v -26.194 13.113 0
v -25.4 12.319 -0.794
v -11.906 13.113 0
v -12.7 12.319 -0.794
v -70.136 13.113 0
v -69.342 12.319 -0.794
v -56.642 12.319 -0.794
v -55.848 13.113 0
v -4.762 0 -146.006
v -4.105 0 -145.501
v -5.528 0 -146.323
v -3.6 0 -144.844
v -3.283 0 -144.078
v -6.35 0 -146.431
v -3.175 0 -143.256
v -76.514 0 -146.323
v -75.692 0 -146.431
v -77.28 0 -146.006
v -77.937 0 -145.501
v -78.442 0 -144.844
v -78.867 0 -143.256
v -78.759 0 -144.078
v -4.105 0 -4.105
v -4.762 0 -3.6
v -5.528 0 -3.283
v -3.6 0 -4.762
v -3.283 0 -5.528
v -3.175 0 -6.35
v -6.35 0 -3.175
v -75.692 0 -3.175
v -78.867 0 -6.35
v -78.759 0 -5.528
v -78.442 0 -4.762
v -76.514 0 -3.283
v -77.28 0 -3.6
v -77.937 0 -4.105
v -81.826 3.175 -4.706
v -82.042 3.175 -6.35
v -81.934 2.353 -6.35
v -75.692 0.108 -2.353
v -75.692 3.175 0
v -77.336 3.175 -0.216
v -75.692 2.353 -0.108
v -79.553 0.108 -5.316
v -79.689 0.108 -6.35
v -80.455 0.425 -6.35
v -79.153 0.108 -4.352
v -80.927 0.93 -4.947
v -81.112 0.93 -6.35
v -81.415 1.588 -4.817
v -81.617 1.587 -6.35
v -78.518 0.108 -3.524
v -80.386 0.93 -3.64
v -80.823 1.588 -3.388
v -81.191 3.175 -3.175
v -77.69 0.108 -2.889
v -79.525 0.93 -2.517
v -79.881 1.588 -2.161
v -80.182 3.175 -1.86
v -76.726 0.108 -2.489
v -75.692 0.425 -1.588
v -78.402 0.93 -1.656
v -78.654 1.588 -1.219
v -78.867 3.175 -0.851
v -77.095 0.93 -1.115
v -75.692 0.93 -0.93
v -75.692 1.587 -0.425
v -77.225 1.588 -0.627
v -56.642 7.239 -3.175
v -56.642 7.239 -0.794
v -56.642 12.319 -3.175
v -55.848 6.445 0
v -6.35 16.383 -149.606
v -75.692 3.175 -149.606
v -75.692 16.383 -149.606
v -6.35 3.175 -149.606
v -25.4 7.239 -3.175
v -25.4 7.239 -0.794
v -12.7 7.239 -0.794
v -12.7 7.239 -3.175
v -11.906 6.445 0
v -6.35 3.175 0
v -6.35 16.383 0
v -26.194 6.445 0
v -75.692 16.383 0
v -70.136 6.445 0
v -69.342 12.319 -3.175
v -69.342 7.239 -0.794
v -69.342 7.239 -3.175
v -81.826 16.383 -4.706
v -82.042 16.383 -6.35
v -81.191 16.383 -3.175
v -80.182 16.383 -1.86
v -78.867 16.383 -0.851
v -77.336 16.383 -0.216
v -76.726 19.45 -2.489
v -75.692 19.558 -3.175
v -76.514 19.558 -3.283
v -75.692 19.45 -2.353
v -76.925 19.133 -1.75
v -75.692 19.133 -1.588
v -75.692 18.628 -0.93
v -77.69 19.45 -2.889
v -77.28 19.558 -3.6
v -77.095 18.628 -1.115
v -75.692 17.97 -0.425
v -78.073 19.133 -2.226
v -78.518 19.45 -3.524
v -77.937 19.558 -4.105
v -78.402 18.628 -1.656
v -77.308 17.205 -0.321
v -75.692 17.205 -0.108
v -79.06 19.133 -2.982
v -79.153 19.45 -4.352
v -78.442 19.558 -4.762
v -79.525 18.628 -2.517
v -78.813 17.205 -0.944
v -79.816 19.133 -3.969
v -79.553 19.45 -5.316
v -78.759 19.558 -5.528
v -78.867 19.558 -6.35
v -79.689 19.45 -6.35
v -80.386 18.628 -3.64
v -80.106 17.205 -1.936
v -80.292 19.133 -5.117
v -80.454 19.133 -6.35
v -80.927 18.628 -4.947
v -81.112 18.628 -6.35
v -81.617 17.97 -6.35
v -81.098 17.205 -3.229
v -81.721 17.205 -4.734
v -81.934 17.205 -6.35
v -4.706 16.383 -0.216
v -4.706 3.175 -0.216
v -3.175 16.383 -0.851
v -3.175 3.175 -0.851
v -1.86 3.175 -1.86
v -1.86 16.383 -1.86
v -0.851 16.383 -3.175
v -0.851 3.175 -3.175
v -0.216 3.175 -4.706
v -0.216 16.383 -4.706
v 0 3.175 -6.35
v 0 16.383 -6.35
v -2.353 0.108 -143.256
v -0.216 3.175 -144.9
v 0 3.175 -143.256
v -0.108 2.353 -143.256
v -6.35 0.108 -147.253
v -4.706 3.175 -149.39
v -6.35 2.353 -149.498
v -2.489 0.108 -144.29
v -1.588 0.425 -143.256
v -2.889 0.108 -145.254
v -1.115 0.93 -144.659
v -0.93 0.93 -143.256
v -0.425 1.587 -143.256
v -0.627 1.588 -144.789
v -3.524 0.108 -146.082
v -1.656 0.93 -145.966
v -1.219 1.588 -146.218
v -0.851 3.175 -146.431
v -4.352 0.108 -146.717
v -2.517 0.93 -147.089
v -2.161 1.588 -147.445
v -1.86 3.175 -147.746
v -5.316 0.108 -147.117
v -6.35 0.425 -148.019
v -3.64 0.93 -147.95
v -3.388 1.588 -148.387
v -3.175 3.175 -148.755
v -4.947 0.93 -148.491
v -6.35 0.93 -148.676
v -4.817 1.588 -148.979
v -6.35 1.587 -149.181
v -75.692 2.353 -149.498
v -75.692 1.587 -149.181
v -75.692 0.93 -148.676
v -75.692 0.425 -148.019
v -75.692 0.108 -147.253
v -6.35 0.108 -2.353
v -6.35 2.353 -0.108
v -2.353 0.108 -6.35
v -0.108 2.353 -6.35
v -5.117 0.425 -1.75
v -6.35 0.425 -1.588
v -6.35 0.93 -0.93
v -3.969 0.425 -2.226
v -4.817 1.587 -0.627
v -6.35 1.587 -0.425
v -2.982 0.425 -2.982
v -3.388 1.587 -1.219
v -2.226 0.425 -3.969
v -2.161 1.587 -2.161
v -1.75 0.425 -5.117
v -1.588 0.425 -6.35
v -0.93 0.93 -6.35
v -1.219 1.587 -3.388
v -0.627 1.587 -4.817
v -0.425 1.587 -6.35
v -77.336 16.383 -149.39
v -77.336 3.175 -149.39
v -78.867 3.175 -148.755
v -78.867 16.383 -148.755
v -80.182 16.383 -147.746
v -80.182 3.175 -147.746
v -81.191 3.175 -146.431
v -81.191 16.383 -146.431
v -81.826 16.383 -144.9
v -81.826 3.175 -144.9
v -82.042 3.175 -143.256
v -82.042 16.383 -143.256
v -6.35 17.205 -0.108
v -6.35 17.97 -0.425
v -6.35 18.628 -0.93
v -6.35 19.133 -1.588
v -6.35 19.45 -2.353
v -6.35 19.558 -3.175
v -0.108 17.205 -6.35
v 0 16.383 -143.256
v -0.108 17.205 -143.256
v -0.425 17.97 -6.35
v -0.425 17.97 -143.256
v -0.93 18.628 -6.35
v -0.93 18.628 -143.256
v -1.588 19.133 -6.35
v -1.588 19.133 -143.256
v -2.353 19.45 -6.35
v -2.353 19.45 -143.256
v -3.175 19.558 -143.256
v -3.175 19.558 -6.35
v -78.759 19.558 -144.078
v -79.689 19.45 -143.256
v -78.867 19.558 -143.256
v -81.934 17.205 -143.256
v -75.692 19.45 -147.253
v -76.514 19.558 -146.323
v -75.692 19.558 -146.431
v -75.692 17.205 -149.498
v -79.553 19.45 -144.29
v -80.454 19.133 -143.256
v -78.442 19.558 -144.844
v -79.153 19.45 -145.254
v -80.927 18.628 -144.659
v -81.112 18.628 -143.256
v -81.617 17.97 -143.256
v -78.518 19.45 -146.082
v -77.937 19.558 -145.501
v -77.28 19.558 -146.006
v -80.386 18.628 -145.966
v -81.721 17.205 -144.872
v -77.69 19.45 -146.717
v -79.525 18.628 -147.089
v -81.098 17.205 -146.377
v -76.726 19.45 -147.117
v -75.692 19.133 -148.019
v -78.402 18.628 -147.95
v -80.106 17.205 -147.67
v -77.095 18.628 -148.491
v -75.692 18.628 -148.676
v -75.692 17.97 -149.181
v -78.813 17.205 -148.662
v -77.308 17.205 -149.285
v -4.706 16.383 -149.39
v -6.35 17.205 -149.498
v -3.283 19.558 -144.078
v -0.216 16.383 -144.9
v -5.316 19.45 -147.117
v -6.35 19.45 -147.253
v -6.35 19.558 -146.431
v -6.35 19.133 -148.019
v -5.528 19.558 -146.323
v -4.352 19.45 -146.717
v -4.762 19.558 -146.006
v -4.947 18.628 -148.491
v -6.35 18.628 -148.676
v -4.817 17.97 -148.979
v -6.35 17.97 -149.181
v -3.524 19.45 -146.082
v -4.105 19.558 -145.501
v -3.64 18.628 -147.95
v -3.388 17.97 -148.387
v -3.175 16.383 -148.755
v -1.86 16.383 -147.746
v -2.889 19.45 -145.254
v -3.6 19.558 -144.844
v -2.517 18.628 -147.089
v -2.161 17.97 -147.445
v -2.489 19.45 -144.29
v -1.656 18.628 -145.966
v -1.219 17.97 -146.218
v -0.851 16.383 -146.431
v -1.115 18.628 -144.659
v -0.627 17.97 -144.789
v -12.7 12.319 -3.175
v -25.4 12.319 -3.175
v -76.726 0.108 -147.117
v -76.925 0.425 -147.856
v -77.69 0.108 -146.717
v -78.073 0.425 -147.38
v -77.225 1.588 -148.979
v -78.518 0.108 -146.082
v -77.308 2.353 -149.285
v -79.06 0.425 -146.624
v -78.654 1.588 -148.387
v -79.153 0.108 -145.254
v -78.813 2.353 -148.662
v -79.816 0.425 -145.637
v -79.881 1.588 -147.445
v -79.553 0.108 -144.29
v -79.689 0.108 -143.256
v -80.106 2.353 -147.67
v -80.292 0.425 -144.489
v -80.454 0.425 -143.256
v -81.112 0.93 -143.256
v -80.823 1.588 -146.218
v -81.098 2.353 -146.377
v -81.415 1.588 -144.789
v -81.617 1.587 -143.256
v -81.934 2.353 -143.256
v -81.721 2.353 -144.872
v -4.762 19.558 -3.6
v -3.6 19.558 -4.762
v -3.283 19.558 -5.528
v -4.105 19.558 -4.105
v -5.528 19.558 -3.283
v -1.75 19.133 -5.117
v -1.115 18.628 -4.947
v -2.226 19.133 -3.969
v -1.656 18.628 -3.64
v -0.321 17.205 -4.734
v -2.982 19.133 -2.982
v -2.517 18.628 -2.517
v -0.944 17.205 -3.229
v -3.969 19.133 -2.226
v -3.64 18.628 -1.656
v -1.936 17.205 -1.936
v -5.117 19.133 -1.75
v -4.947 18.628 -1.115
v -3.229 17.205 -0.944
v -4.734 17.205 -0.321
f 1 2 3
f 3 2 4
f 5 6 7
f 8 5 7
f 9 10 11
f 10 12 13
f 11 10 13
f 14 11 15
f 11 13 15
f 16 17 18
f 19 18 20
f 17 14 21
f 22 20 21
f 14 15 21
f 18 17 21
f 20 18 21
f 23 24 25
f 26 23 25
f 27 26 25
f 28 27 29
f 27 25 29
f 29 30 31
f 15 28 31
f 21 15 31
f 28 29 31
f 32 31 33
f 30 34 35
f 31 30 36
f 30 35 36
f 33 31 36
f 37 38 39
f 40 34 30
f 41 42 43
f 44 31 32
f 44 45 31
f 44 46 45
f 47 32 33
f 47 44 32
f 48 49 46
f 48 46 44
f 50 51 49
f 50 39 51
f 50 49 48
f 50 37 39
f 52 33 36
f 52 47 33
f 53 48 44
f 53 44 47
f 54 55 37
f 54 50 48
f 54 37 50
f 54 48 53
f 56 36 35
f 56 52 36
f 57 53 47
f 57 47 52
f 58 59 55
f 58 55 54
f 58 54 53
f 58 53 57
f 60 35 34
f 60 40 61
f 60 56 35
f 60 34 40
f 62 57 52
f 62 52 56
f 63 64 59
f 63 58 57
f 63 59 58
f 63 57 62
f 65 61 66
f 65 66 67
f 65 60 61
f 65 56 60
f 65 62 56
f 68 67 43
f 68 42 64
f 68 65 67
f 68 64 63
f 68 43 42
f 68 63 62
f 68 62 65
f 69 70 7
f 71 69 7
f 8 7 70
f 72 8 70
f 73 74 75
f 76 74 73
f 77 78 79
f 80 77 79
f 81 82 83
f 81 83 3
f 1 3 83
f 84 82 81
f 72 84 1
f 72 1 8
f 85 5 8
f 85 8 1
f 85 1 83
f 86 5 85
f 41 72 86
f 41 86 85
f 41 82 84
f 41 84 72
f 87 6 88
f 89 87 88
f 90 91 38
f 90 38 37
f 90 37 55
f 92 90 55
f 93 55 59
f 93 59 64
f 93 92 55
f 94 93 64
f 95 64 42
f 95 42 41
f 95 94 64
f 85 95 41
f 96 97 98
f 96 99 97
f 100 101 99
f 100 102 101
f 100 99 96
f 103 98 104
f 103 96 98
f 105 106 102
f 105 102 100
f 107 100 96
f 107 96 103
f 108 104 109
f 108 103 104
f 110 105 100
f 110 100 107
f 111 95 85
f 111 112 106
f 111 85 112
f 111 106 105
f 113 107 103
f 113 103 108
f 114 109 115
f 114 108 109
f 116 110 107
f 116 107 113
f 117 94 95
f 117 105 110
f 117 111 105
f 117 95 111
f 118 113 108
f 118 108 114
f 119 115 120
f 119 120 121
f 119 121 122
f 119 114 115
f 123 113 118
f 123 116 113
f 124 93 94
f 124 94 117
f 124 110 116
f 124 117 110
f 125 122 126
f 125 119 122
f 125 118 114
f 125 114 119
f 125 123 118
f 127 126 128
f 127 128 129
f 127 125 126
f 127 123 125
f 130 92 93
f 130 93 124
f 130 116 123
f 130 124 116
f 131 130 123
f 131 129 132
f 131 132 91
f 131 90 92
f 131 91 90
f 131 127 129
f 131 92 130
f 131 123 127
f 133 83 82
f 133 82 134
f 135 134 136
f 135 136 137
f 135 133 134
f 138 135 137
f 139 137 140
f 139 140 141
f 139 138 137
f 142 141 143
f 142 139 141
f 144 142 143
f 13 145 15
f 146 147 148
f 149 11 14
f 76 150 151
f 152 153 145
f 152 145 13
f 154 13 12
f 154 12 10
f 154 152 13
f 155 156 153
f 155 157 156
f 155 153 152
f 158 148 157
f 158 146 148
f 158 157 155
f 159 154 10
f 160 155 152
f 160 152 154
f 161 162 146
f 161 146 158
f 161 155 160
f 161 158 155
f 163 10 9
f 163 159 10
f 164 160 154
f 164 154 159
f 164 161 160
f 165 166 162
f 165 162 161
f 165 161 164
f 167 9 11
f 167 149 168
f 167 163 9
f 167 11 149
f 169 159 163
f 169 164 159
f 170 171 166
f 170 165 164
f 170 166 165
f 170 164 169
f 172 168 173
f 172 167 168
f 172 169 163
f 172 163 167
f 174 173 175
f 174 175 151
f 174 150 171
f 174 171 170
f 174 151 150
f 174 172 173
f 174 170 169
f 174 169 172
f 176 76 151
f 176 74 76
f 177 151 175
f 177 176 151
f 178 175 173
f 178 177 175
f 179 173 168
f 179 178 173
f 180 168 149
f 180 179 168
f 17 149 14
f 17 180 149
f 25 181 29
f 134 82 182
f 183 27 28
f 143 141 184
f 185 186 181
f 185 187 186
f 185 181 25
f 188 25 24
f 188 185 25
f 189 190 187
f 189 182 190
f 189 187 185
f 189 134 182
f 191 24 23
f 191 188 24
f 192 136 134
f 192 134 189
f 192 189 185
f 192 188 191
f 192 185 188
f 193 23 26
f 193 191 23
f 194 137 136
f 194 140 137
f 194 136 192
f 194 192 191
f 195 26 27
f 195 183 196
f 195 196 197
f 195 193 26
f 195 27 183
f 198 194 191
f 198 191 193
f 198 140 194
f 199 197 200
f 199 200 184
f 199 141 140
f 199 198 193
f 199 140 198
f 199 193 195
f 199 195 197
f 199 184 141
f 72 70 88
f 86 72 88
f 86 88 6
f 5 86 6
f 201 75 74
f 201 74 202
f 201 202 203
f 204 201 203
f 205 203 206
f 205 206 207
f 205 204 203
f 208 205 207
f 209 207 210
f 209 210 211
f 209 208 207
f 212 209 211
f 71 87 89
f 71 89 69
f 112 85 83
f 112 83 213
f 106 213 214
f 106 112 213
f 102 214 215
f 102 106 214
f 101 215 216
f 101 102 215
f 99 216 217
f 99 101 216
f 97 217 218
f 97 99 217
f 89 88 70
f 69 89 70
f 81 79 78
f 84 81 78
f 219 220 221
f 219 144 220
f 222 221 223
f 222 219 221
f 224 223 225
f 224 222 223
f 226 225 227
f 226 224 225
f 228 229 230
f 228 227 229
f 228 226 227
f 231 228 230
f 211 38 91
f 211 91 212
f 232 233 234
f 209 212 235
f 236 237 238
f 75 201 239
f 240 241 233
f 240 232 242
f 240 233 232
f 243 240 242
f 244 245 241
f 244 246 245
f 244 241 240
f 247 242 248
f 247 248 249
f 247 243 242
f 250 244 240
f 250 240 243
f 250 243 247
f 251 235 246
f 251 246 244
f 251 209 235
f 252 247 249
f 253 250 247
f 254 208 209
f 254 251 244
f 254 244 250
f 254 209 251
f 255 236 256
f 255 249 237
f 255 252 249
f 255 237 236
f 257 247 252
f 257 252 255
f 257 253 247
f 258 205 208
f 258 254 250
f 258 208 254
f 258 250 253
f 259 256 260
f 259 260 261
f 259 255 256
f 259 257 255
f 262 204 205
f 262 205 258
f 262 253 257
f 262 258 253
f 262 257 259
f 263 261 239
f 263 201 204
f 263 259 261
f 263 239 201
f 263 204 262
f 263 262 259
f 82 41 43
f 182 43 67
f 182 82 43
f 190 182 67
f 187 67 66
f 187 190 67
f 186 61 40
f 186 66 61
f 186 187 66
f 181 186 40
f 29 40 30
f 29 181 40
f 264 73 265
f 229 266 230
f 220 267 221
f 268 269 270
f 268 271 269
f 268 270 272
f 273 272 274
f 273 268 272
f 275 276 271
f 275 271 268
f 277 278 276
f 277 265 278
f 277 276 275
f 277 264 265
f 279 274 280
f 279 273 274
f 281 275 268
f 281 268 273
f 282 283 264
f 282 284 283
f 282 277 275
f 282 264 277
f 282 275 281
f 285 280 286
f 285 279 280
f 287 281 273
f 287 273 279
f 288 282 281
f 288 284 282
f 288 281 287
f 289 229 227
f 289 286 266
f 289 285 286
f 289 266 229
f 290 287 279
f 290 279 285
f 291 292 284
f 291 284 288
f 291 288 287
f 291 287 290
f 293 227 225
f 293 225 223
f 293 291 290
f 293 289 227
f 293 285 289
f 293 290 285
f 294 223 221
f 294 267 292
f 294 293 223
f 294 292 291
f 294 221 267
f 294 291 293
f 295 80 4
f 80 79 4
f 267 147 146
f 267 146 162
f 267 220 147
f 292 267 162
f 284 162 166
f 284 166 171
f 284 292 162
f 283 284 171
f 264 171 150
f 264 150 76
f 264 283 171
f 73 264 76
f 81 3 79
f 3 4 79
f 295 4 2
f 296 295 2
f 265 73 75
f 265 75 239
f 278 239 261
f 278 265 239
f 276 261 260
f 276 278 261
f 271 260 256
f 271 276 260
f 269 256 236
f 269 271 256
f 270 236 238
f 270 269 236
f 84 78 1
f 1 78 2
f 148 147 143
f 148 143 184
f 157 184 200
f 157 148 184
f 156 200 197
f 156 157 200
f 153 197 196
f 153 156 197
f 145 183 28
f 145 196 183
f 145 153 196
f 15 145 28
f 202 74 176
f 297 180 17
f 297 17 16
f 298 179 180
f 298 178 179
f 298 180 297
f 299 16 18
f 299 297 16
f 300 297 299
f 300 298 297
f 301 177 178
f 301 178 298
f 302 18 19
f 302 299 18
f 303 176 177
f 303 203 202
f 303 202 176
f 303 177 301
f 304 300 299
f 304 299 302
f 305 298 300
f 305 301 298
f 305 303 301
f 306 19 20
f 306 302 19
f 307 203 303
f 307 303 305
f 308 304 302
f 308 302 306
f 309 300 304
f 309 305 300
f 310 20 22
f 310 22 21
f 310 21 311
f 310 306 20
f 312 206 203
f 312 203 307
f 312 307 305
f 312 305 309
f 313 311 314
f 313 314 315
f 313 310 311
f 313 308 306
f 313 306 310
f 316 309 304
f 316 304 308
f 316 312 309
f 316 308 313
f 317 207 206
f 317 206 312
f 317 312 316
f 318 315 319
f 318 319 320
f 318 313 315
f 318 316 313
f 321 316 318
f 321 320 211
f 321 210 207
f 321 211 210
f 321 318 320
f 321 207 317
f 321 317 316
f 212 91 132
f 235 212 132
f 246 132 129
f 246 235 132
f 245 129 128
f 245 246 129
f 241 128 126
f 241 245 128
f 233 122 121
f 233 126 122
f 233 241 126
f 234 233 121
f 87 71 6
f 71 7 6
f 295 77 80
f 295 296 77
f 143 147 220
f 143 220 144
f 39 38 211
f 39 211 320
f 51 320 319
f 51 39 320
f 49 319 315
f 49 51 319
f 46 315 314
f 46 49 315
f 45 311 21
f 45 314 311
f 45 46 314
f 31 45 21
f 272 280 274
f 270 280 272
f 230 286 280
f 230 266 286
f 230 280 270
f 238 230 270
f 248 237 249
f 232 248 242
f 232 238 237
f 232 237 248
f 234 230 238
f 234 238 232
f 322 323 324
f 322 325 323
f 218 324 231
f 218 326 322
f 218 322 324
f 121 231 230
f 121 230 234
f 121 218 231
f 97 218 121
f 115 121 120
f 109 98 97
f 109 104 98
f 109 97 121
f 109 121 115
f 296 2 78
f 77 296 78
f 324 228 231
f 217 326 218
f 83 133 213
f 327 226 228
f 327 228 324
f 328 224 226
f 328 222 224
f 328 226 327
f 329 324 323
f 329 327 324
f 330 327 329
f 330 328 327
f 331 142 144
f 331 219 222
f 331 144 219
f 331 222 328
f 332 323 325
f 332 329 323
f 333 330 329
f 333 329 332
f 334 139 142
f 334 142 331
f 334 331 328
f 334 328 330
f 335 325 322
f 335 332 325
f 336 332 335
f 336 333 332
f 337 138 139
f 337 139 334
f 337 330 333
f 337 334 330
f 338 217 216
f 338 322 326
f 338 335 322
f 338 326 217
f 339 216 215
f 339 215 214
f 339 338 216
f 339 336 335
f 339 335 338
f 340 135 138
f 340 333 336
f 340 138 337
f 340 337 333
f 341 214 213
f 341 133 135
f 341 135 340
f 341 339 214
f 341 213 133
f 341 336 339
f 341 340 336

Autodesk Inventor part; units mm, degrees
ref_plane "YZ Plane" through (0, 0, 0) normal (1, 0, 0) x (0, 1, 0)
ref_plane "XZ Plane" through (0, 0, 0) normal (0, 1, 0) x (-1, 0, 0)
ref_plane "XY Plane" through (0, 0, 0) normal (0, 0, 1) x (1, 0, 0)
sketch "Sketch1" plane through (0, 0, 0) normal (0, 1, 0) x (-1, 0, 0)
  line L0 (0, 0) -> (82.042, 0)
  line L1 (82.042, 0) -> (82.042, -149.606)
  line L2 (82.042, -149.606) -> (0, -149.606)
  line L3 (0, -149.606) -> (0, 0)
  dimension "d0" = 82.042
  dimension "d1" = 149.606
extrude "Extrusion1" add sketch "Sketch1" along normal blind 19.558
fillet "Fillet1" radius 6.35 4 edges at (0, 9.779, 0) (-82.042, 9.779, 0) (-82.042, 9.779, -149.606) (0, 9.779, -149.606)
fillet "Fillet2" radius 3.175 16 edges at (-80.1821, 19.558, -147.7461) (-82.042, 19.558, -74.803) (-80.1821, 19.558, -1.8599) (-41.021, 19.558, 0) (-1.8599, 19.558, -1.8599) (0, 19.558, -74.803) (-1.8599, 19.558, -147.7461) (-41.021, 19.558, -149.606) (-1.8599, 0, -1.8599) (-41.021, 0, 0) (-80.1821, 0, -1.8599) (-82.042, 0, -74.803) (-80.1821, 0, -147.7461) (-41.021, 0, -149.606) (-1.8599, 0, -147.7461) (0, 0, -74.803)
sketch "Sketch2" plane through (-75.692, 3.175, 0) normal (0, 0, 1) x (1, 0, 0)
  line L0 (69.342, 0) -> (0, 0) projected
  line L1 (69.342, 13.208) -> (69.342, 0) projected
  line L2 (0, 13.208) -> (69.342, 13.208) projected
  line L3 (0, 0) -> (0, 13.208) projected
  line L4 (0, 13.208) -> (0, 0) projected
  line L5 (0, 6.604) -> (12.7, 6.604)
  line L6 (69.342, 0) -> (69.342, 13.208) projected
  line L7 (69.342, 6.604) -> (56.642, 6.604)
  line L8 (6.35, 4.064) -> (19.05, 4.064)
  line L9 (19.05, 4.064) -> (19.05, 9.144)
  line L10 (19.05, 9.144) -> (6.35, 9.144)
  line L11 (6.35, 9.144) -> (6.35, 4.064)
  line L12 (6.35, 4.064) -> (19.05, 9.144) construction
  line L13 (19.05, 4.064) -> (6.35, 9.144) construction
  line L14 (50.292, 4.064) -> (62.992, 4.064)
  line L15 (62.992, 4.064) -> (62.992, 9.144)
  line L16 (62.992, 9.144) -> (50.292, 9.144)
  line L17 (50.292, 9.144) -> (50.292, 4.064)
  line L18 (50.292, 4.064) -> (62.992, 9.144) construction
  line L19 (62.992, 4.064) -> (50.292, 9.144) construction
  point P0 (75.692, -3.175)
  dimension "d6" = 12.7
  dimension "d7" = 12.7
  dimension "d8" = 12.7
  dimension "d9" = 5.08
  dimension "d10" = 12.7
  dimension "d11" = 5.08
extrude "Extrusion2" cut sketch "Sketch2" against normal blind 3.175 contours L15 L14 L17 L16 | L11 L10 L9 L8
chamfer "Chamfer1" distance 0.7937 angle 45 8 edges at (-69.342, 9.779, 0) (-62.992, 12.319, 0) (-62.992, 7.239, 0) (-56.642, 9.779, 0) (-25.4, 9.779, 0) (-19.05, 12.319, 0) (-19.05, 7.239, 0) (-12.7, 9.779, 0)
properties part number "Battery"
